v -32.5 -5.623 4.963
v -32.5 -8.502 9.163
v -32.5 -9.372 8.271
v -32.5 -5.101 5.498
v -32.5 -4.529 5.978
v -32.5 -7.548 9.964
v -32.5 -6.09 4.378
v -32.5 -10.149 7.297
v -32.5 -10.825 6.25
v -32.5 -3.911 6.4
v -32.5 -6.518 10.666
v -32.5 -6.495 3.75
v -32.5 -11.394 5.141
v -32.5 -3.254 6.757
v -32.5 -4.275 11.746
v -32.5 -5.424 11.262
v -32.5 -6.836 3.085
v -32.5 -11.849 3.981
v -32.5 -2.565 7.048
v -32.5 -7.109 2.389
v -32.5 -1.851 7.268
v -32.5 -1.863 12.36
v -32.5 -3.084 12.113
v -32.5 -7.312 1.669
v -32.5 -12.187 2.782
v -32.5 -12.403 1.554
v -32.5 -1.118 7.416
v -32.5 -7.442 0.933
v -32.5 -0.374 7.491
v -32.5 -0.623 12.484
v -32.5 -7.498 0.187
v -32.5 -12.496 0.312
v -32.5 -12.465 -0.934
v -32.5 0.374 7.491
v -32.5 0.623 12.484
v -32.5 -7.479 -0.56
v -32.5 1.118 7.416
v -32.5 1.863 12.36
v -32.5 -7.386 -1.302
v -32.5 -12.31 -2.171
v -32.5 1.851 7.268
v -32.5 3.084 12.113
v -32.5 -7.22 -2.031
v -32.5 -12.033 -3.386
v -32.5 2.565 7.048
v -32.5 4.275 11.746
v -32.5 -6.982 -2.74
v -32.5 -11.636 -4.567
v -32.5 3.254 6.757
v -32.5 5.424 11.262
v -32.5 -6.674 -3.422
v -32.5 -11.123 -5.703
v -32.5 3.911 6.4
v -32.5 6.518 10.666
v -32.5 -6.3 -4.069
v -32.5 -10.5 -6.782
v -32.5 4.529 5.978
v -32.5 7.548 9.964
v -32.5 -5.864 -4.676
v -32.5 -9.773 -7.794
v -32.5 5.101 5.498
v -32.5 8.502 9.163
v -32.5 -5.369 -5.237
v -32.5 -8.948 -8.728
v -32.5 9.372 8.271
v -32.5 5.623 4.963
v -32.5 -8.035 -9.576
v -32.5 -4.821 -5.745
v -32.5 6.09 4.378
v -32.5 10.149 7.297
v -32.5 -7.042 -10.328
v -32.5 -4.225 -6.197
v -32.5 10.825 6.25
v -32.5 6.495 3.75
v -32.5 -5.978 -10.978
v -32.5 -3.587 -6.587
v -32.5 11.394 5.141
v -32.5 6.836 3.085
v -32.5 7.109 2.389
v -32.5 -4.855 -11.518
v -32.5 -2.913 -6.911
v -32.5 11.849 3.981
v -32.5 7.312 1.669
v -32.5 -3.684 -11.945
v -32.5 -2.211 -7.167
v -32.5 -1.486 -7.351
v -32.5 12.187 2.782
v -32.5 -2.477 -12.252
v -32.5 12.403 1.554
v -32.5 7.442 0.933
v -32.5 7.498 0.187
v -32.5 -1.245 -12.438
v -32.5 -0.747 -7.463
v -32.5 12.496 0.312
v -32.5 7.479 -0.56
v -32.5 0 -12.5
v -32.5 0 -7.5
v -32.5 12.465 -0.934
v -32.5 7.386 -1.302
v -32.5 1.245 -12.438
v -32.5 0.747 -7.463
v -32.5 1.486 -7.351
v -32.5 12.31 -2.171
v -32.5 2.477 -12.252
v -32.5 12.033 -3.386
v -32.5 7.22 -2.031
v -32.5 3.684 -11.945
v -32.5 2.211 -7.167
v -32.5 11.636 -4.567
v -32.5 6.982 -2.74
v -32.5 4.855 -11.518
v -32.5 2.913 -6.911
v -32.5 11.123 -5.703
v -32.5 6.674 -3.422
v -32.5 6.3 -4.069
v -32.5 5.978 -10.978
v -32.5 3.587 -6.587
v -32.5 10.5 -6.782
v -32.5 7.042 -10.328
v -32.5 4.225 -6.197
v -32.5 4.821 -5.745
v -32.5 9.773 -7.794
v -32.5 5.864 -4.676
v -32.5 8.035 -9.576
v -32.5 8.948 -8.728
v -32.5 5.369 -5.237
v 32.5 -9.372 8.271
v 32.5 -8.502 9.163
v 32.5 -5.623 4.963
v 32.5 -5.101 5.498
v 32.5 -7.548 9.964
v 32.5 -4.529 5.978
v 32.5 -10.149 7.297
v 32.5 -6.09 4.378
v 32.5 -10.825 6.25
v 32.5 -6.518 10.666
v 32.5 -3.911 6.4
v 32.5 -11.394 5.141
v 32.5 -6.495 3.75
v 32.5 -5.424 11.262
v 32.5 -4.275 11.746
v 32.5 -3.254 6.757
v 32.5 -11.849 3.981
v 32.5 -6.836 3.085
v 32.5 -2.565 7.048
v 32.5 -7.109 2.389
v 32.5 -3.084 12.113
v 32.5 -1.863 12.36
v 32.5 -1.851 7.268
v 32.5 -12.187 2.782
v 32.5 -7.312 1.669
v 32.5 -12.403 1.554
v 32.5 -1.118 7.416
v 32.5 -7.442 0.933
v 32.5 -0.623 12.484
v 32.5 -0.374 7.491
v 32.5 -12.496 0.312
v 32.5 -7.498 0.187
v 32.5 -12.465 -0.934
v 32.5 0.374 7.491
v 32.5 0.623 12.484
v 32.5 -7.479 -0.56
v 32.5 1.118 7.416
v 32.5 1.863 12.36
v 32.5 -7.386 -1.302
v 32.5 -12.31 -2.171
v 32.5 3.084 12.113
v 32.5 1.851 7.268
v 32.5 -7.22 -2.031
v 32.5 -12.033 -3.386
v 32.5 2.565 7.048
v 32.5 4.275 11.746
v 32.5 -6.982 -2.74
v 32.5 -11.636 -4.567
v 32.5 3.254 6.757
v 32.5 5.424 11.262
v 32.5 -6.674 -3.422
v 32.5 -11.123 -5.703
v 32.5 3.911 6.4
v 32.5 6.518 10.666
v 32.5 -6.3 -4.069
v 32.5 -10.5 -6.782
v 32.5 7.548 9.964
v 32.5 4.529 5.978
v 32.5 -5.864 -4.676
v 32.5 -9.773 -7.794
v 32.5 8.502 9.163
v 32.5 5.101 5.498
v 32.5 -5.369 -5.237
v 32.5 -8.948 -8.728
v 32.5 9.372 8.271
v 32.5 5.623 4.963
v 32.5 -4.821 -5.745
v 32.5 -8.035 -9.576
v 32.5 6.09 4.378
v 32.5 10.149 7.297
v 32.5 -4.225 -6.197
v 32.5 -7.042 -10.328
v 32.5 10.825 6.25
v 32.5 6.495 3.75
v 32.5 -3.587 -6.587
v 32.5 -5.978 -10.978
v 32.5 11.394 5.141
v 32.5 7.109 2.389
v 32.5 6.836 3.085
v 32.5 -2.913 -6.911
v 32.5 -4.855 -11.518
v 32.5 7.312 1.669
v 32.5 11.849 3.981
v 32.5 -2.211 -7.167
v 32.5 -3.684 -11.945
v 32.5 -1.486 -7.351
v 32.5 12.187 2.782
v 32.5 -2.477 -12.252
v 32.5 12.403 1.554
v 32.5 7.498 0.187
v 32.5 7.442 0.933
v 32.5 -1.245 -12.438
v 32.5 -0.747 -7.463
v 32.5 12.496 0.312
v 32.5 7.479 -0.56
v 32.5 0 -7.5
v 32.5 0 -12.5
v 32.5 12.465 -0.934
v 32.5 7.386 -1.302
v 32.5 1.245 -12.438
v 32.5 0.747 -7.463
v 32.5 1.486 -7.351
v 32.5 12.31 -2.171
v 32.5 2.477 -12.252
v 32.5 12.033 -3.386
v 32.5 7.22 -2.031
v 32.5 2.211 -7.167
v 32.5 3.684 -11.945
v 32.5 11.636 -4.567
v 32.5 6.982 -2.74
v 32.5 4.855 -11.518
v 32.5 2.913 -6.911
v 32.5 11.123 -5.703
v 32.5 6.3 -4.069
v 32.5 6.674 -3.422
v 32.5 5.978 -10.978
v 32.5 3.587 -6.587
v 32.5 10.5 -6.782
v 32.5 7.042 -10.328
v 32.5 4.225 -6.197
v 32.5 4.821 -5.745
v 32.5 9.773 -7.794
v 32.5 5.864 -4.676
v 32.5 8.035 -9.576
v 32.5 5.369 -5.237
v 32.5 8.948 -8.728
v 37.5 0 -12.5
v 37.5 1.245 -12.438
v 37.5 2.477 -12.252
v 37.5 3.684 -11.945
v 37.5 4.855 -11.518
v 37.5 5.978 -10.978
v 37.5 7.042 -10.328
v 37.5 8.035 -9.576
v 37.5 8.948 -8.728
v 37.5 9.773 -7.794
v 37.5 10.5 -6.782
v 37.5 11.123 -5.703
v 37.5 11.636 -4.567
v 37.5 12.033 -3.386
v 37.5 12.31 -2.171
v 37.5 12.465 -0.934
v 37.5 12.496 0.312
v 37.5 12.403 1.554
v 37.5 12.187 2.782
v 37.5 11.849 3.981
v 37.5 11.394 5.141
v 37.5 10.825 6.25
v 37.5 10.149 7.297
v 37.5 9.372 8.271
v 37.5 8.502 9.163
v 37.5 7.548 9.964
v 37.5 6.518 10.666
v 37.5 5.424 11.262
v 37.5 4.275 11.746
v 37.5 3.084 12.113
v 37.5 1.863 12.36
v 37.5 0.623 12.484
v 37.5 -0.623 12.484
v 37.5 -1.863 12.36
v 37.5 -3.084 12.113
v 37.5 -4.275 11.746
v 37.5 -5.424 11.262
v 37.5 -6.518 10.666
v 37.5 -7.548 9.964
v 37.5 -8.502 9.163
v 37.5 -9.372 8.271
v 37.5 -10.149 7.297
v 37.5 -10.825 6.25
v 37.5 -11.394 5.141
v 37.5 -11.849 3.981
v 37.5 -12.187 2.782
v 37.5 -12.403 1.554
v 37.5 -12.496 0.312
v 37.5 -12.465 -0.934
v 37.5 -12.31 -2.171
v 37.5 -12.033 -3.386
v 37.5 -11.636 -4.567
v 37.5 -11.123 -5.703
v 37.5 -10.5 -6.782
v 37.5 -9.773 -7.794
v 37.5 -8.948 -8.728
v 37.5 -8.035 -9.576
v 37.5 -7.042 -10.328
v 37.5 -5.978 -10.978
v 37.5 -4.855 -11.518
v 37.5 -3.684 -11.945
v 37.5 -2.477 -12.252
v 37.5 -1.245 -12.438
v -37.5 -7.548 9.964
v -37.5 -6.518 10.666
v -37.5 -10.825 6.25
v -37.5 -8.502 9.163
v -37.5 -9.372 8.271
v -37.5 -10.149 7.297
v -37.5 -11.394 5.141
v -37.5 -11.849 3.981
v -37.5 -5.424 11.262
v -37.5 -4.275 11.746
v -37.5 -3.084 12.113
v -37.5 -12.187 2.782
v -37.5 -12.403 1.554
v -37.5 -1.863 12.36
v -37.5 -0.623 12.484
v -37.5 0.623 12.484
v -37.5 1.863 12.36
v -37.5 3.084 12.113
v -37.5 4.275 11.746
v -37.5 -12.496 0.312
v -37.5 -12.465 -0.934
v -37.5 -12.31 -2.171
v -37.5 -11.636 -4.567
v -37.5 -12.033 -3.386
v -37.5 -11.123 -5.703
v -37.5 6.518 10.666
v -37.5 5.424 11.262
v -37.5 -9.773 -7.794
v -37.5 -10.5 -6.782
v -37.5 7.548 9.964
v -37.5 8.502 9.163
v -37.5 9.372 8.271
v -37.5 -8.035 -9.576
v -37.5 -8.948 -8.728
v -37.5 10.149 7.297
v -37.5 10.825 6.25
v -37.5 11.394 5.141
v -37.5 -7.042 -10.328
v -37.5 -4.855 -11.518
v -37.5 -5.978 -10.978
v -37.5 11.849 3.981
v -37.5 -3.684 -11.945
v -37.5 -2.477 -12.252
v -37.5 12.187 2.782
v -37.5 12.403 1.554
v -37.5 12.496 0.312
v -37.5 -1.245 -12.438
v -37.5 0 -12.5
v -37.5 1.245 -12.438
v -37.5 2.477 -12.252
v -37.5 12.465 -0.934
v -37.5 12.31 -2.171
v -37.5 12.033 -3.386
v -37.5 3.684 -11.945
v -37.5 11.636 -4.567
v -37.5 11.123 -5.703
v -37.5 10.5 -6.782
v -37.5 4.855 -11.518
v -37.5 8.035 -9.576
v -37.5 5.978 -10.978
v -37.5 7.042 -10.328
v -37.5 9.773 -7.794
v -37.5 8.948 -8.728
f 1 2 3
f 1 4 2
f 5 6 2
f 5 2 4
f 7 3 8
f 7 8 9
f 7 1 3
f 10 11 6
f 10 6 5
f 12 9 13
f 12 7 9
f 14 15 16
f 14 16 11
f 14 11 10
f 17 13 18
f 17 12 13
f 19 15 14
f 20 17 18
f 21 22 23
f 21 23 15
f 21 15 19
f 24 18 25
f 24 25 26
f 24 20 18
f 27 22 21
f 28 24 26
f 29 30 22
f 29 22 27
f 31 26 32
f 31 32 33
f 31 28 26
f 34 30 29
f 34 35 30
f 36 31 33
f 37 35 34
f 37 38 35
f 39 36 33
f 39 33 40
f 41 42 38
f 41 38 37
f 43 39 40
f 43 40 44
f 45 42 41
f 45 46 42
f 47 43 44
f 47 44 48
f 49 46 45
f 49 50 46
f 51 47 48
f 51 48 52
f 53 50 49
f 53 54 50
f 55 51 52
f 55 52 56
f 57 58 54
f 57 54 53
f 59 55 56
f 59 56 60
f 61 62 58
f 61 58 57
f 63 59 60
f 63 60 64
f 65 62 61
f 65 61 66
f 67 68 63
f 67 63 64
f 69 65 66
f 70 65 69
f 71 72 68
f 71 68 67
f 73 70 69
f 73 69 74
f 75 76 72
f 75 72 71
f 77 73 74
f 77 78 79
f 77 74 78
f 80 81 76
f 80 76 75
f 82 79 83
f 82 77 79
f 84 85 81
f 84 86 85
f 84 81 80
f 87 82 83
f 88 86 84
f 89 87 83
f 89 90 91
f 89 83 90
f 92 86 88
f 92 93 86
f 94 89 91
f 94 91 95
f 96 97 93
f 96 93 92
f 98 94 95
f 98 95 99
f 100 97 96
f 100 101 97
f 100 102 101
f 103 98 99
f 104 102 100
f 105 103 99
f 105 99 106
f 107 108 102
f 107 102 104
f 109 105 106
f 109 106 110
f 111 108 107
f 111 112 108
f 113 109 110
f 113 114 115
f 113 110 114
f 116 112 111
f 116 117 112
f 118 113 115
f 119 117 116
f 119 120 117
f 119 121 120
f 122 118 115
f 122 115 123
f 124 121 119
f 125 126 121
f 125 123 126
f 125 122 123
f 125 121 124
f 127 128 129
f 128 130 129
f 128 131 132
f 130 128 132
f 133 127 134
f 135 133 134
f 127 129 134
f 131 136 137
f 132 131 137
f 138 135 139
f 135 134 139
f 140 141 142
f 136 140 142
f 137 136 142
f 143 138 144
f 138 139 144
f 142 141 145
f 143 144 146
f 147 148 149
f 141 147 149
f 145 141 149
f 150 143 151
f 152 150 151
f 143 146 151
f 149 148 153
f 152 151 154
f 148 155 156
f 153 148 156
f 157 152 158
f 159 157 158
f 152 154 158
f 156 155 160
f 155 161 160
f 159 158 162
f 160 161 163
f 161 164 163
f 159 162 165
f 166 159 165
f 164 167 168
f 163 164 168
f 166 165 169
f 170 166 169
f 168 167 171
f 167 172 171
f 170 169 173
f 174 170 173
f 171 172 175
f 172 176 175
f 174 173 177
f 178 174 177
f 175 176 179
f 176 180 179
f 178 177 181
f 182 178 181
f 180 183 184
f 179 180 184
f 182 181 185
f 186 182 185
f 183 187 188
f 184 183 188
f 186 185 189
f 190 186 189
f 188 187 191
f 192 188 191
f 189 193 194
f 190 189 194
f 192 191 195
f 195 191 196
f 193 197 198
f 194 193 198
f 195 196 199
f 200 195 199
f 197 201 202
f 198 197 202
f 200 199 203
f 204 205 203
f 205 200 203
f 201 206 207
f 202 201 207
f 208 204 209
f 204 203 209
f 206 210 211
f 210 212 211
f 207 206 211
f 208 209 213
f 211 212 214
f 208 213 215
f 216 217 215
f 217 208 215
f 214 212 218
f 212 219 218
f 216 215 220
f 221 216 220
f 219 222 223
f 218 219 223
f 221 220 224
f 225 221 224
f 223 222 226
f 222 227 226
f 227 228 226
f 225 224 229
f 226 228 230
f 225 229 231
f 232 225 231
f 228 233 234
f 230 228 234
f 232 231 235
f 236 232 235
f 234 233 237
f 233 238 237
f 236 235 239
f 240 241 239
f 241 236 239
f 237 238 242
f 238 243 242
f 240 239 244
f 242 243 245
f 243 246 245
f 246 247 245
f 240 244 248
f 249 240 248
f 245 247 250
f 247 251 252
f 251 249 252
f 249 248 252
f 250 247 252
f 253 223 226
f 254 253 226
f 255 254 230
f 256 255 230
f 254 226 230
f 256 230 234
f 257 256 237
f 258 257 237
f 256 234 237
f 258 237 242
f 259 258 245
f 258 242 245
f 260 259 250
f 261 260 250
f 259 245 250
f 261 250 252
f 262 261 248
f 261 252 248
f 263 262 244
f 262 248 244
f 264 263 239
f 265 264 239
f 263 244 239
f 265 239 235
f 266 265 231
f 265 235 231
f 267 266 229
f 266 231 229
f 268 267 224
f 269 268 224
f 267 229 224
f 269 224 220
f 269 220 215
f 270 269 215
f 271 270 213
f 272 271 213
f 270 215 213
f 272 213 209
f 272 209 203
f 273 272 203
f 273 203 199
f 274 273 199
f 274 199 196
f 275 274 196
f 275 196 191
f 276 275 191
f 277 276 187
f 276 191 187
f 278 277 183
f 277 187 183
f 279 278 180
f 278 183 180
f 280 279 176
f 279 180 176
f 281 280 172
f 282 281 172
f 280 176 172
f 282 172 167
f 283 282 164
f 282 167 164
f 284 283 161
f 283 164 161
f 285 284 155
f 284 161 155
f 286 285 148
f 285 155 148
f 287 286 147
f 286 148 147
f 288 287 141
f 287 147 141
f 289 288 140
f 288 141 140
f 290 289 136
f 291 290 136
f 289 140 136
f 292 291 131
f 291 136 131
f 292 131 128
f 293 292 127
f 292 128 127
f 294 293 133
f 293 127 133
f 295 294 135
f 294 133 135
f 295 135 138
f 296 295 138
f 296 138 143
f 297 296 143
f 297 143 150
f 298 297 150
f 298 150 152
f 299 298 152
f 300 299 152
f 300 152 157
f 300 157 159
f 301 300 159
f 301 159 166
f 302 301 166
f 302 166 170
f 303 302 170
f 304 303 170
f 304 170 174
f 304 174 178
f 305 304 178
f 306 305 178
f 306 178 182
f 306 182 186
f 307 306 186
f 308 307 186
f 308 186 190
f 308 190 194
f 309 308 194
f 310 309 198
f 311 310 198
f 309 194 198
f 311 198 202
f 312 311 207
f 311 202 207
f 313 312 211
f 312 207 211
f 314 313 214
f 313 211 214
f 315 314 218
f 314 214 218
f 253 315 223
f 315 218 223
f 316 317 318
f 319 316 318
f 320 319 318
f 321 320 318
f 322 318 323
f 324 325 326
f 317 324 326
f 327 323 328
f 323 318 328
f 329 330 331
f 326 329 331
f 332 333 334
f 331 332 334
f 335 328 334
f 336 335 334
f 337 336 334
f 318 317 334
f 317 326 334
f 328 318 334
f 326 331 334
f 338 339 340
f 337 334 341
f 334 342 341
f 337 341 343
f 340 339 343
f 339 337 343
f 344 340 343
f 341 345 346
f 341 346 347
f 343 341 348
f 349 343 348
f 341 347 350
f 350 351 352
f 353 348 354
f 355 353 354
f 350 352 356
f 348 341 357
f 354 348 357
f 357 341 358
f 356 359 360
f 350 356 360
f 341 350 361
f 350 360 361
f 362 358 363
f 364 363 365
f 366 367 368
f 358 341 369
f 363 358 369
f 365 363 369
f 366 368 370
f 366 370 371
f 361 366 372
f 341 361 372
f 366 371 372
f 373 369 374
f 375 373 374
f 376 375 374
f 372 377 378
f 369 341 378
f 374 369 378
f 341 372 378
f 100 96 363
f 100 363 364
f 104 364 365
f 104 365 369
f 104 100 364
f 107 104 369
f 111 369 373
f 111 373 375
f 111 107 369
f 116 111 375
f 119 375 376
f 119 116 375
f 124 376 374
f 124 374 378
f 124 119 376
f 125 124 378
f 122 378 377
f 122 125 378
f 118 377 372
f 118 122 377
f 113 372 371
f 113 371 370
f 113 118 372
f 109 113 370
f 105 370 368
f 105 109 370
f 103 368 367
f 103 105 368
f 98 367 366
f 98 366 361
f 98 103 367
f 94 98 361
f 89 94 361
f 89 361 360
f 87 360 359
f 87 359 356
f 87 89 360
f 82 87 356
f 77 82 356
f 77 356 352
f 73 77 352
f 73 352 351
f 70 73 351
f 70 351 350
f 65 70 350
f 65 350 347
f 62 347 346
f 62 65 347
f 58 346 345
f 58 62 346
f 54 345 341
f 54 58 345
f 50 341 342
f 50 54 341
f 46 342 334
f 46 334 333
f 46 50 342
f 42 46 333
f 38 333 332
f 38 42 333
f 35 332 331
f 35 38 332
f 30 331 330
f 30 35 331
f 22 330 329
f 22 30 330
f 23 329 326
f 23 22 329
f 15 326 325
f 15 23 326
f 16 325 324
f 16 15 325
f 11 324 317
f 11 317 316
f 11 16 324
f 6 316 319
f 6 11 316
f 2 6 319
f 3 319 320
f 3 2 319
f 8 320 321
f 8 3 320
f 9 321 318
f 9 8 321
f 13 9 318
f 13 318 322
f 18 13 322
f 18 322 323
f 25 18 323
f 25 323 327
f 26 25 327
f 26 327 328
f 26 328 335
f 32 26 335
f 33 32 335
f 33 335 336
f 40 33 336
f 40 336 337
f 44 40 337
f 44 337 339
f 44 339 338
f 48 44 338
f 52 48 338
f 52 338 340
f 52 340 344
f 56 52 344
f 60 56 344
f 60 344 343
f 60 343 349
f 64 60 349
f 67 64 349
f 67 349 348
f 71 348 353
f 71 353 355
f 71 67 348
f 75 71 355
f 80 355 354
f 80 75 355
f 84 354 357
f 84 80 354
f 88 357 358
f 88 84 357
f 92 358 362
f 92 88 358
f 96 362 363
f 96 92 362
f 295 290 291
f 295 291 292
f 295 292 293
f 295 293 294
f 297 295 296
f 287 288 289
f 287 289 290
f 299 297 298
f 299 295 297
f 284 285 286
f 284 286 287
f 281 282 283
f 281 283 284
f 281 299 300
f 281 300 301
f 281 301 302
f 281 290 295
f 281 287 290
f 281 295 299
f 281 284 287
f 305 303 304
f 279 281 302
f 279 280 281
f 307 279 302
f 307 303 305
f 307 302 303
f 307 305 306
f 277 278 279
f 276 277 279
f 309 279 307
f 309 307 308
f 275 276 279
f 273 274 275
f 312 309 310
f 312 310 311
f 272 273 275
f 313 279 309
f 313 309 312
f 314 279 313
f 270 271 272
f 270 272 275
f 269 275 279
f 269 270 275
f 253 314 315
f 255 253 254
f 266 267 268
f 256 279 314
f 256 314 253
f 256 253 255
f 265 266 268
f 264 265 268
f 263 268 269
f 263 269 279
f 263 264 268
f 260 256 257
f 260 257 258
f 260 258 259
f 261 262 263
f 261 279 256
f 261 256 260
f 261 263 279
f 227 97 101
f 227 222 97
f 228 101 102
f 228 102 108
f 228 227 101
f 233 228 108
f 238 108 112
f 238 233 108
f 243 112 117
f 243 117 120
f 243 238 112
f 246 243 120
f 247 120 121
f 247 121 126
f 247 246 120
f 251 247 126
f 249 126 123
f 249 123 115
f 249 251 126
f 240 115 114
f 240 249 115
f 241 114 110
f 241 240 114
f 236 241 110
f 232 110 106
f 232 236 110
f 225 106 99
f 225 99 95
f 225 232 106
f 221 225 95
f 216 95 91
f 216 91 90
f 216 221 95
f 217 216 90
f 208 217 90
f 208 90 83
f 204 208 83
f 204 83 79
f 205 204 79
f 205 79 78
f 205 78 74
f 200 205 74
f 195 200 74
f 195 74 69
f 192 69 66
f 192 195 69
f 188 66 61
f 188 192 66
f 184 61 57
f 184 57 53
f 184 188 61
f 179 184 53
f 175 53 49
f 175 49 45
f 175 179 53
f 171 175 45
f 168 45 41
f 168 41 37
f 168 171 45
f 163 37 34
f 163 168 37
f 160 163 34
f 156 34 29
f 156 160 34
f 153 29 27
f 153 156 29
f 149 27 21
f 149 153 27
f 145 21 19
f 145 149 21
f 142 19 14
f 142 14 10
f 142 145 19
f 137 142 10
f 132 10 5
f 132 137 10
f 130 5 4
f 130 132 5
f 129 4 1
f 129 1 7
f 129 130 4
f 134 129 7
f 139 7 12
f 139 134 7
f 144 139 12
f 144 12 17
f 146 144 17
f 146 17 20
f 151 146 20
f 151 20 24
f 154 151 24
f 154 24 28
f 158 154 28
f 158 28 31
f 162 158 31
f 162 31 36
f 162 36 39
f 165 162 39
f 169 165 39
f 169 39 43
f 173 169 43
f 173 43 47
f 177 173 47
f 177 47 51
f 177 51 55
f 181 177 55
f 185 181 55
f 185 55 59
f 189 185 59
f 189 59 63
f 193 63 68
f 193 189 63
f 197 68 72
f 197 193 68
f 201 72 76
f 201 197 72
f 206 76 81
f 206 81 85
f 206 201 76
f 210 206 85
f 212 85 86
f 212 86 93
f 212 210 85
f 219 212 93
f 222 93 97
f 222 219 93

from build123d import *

# Parameters (mm, degrees)
SKETCH1_R           = 7.5
BOSS_EXTRUDE1_DEPTH = 32.5
SKETCH4_R           = 12.5
BOSS_EXTRUDE3_DEPTH = 5


with BuildPart() as part:
    # Sketch1 → Boss-Extrude1 (new, symmetric)
    with BuildSketch(Plane(origin=(0, 0, 0), x_dir=(0, 0, -1), z_dir=(1, 0, 0))):
        Circle(SKETCH1_R)
    extrude(amount=BOSS_EXTRUDE1_DEPTH, both=True)

    # Sketch4 → Boss-Extrude3 (add)
    with BuildSketch(Plane(origin=(32.5, 0, 0), x_dir=(0, 0, -1), z_dir=(1, 0, 0))):
        Circle(SKETCH4_R)
    boss_extrude3 = extrude(amount=BOSS_EXTRUDE3_DEPTH)

    # Mirror1: Boss-Extrude3 across plane
    add(boss_extrude3.mirror(Plane(origin=(0, 0, 0), x_dir=(0, 0, 1), z_dir=(1, 0, 0))))


solid = part.part
